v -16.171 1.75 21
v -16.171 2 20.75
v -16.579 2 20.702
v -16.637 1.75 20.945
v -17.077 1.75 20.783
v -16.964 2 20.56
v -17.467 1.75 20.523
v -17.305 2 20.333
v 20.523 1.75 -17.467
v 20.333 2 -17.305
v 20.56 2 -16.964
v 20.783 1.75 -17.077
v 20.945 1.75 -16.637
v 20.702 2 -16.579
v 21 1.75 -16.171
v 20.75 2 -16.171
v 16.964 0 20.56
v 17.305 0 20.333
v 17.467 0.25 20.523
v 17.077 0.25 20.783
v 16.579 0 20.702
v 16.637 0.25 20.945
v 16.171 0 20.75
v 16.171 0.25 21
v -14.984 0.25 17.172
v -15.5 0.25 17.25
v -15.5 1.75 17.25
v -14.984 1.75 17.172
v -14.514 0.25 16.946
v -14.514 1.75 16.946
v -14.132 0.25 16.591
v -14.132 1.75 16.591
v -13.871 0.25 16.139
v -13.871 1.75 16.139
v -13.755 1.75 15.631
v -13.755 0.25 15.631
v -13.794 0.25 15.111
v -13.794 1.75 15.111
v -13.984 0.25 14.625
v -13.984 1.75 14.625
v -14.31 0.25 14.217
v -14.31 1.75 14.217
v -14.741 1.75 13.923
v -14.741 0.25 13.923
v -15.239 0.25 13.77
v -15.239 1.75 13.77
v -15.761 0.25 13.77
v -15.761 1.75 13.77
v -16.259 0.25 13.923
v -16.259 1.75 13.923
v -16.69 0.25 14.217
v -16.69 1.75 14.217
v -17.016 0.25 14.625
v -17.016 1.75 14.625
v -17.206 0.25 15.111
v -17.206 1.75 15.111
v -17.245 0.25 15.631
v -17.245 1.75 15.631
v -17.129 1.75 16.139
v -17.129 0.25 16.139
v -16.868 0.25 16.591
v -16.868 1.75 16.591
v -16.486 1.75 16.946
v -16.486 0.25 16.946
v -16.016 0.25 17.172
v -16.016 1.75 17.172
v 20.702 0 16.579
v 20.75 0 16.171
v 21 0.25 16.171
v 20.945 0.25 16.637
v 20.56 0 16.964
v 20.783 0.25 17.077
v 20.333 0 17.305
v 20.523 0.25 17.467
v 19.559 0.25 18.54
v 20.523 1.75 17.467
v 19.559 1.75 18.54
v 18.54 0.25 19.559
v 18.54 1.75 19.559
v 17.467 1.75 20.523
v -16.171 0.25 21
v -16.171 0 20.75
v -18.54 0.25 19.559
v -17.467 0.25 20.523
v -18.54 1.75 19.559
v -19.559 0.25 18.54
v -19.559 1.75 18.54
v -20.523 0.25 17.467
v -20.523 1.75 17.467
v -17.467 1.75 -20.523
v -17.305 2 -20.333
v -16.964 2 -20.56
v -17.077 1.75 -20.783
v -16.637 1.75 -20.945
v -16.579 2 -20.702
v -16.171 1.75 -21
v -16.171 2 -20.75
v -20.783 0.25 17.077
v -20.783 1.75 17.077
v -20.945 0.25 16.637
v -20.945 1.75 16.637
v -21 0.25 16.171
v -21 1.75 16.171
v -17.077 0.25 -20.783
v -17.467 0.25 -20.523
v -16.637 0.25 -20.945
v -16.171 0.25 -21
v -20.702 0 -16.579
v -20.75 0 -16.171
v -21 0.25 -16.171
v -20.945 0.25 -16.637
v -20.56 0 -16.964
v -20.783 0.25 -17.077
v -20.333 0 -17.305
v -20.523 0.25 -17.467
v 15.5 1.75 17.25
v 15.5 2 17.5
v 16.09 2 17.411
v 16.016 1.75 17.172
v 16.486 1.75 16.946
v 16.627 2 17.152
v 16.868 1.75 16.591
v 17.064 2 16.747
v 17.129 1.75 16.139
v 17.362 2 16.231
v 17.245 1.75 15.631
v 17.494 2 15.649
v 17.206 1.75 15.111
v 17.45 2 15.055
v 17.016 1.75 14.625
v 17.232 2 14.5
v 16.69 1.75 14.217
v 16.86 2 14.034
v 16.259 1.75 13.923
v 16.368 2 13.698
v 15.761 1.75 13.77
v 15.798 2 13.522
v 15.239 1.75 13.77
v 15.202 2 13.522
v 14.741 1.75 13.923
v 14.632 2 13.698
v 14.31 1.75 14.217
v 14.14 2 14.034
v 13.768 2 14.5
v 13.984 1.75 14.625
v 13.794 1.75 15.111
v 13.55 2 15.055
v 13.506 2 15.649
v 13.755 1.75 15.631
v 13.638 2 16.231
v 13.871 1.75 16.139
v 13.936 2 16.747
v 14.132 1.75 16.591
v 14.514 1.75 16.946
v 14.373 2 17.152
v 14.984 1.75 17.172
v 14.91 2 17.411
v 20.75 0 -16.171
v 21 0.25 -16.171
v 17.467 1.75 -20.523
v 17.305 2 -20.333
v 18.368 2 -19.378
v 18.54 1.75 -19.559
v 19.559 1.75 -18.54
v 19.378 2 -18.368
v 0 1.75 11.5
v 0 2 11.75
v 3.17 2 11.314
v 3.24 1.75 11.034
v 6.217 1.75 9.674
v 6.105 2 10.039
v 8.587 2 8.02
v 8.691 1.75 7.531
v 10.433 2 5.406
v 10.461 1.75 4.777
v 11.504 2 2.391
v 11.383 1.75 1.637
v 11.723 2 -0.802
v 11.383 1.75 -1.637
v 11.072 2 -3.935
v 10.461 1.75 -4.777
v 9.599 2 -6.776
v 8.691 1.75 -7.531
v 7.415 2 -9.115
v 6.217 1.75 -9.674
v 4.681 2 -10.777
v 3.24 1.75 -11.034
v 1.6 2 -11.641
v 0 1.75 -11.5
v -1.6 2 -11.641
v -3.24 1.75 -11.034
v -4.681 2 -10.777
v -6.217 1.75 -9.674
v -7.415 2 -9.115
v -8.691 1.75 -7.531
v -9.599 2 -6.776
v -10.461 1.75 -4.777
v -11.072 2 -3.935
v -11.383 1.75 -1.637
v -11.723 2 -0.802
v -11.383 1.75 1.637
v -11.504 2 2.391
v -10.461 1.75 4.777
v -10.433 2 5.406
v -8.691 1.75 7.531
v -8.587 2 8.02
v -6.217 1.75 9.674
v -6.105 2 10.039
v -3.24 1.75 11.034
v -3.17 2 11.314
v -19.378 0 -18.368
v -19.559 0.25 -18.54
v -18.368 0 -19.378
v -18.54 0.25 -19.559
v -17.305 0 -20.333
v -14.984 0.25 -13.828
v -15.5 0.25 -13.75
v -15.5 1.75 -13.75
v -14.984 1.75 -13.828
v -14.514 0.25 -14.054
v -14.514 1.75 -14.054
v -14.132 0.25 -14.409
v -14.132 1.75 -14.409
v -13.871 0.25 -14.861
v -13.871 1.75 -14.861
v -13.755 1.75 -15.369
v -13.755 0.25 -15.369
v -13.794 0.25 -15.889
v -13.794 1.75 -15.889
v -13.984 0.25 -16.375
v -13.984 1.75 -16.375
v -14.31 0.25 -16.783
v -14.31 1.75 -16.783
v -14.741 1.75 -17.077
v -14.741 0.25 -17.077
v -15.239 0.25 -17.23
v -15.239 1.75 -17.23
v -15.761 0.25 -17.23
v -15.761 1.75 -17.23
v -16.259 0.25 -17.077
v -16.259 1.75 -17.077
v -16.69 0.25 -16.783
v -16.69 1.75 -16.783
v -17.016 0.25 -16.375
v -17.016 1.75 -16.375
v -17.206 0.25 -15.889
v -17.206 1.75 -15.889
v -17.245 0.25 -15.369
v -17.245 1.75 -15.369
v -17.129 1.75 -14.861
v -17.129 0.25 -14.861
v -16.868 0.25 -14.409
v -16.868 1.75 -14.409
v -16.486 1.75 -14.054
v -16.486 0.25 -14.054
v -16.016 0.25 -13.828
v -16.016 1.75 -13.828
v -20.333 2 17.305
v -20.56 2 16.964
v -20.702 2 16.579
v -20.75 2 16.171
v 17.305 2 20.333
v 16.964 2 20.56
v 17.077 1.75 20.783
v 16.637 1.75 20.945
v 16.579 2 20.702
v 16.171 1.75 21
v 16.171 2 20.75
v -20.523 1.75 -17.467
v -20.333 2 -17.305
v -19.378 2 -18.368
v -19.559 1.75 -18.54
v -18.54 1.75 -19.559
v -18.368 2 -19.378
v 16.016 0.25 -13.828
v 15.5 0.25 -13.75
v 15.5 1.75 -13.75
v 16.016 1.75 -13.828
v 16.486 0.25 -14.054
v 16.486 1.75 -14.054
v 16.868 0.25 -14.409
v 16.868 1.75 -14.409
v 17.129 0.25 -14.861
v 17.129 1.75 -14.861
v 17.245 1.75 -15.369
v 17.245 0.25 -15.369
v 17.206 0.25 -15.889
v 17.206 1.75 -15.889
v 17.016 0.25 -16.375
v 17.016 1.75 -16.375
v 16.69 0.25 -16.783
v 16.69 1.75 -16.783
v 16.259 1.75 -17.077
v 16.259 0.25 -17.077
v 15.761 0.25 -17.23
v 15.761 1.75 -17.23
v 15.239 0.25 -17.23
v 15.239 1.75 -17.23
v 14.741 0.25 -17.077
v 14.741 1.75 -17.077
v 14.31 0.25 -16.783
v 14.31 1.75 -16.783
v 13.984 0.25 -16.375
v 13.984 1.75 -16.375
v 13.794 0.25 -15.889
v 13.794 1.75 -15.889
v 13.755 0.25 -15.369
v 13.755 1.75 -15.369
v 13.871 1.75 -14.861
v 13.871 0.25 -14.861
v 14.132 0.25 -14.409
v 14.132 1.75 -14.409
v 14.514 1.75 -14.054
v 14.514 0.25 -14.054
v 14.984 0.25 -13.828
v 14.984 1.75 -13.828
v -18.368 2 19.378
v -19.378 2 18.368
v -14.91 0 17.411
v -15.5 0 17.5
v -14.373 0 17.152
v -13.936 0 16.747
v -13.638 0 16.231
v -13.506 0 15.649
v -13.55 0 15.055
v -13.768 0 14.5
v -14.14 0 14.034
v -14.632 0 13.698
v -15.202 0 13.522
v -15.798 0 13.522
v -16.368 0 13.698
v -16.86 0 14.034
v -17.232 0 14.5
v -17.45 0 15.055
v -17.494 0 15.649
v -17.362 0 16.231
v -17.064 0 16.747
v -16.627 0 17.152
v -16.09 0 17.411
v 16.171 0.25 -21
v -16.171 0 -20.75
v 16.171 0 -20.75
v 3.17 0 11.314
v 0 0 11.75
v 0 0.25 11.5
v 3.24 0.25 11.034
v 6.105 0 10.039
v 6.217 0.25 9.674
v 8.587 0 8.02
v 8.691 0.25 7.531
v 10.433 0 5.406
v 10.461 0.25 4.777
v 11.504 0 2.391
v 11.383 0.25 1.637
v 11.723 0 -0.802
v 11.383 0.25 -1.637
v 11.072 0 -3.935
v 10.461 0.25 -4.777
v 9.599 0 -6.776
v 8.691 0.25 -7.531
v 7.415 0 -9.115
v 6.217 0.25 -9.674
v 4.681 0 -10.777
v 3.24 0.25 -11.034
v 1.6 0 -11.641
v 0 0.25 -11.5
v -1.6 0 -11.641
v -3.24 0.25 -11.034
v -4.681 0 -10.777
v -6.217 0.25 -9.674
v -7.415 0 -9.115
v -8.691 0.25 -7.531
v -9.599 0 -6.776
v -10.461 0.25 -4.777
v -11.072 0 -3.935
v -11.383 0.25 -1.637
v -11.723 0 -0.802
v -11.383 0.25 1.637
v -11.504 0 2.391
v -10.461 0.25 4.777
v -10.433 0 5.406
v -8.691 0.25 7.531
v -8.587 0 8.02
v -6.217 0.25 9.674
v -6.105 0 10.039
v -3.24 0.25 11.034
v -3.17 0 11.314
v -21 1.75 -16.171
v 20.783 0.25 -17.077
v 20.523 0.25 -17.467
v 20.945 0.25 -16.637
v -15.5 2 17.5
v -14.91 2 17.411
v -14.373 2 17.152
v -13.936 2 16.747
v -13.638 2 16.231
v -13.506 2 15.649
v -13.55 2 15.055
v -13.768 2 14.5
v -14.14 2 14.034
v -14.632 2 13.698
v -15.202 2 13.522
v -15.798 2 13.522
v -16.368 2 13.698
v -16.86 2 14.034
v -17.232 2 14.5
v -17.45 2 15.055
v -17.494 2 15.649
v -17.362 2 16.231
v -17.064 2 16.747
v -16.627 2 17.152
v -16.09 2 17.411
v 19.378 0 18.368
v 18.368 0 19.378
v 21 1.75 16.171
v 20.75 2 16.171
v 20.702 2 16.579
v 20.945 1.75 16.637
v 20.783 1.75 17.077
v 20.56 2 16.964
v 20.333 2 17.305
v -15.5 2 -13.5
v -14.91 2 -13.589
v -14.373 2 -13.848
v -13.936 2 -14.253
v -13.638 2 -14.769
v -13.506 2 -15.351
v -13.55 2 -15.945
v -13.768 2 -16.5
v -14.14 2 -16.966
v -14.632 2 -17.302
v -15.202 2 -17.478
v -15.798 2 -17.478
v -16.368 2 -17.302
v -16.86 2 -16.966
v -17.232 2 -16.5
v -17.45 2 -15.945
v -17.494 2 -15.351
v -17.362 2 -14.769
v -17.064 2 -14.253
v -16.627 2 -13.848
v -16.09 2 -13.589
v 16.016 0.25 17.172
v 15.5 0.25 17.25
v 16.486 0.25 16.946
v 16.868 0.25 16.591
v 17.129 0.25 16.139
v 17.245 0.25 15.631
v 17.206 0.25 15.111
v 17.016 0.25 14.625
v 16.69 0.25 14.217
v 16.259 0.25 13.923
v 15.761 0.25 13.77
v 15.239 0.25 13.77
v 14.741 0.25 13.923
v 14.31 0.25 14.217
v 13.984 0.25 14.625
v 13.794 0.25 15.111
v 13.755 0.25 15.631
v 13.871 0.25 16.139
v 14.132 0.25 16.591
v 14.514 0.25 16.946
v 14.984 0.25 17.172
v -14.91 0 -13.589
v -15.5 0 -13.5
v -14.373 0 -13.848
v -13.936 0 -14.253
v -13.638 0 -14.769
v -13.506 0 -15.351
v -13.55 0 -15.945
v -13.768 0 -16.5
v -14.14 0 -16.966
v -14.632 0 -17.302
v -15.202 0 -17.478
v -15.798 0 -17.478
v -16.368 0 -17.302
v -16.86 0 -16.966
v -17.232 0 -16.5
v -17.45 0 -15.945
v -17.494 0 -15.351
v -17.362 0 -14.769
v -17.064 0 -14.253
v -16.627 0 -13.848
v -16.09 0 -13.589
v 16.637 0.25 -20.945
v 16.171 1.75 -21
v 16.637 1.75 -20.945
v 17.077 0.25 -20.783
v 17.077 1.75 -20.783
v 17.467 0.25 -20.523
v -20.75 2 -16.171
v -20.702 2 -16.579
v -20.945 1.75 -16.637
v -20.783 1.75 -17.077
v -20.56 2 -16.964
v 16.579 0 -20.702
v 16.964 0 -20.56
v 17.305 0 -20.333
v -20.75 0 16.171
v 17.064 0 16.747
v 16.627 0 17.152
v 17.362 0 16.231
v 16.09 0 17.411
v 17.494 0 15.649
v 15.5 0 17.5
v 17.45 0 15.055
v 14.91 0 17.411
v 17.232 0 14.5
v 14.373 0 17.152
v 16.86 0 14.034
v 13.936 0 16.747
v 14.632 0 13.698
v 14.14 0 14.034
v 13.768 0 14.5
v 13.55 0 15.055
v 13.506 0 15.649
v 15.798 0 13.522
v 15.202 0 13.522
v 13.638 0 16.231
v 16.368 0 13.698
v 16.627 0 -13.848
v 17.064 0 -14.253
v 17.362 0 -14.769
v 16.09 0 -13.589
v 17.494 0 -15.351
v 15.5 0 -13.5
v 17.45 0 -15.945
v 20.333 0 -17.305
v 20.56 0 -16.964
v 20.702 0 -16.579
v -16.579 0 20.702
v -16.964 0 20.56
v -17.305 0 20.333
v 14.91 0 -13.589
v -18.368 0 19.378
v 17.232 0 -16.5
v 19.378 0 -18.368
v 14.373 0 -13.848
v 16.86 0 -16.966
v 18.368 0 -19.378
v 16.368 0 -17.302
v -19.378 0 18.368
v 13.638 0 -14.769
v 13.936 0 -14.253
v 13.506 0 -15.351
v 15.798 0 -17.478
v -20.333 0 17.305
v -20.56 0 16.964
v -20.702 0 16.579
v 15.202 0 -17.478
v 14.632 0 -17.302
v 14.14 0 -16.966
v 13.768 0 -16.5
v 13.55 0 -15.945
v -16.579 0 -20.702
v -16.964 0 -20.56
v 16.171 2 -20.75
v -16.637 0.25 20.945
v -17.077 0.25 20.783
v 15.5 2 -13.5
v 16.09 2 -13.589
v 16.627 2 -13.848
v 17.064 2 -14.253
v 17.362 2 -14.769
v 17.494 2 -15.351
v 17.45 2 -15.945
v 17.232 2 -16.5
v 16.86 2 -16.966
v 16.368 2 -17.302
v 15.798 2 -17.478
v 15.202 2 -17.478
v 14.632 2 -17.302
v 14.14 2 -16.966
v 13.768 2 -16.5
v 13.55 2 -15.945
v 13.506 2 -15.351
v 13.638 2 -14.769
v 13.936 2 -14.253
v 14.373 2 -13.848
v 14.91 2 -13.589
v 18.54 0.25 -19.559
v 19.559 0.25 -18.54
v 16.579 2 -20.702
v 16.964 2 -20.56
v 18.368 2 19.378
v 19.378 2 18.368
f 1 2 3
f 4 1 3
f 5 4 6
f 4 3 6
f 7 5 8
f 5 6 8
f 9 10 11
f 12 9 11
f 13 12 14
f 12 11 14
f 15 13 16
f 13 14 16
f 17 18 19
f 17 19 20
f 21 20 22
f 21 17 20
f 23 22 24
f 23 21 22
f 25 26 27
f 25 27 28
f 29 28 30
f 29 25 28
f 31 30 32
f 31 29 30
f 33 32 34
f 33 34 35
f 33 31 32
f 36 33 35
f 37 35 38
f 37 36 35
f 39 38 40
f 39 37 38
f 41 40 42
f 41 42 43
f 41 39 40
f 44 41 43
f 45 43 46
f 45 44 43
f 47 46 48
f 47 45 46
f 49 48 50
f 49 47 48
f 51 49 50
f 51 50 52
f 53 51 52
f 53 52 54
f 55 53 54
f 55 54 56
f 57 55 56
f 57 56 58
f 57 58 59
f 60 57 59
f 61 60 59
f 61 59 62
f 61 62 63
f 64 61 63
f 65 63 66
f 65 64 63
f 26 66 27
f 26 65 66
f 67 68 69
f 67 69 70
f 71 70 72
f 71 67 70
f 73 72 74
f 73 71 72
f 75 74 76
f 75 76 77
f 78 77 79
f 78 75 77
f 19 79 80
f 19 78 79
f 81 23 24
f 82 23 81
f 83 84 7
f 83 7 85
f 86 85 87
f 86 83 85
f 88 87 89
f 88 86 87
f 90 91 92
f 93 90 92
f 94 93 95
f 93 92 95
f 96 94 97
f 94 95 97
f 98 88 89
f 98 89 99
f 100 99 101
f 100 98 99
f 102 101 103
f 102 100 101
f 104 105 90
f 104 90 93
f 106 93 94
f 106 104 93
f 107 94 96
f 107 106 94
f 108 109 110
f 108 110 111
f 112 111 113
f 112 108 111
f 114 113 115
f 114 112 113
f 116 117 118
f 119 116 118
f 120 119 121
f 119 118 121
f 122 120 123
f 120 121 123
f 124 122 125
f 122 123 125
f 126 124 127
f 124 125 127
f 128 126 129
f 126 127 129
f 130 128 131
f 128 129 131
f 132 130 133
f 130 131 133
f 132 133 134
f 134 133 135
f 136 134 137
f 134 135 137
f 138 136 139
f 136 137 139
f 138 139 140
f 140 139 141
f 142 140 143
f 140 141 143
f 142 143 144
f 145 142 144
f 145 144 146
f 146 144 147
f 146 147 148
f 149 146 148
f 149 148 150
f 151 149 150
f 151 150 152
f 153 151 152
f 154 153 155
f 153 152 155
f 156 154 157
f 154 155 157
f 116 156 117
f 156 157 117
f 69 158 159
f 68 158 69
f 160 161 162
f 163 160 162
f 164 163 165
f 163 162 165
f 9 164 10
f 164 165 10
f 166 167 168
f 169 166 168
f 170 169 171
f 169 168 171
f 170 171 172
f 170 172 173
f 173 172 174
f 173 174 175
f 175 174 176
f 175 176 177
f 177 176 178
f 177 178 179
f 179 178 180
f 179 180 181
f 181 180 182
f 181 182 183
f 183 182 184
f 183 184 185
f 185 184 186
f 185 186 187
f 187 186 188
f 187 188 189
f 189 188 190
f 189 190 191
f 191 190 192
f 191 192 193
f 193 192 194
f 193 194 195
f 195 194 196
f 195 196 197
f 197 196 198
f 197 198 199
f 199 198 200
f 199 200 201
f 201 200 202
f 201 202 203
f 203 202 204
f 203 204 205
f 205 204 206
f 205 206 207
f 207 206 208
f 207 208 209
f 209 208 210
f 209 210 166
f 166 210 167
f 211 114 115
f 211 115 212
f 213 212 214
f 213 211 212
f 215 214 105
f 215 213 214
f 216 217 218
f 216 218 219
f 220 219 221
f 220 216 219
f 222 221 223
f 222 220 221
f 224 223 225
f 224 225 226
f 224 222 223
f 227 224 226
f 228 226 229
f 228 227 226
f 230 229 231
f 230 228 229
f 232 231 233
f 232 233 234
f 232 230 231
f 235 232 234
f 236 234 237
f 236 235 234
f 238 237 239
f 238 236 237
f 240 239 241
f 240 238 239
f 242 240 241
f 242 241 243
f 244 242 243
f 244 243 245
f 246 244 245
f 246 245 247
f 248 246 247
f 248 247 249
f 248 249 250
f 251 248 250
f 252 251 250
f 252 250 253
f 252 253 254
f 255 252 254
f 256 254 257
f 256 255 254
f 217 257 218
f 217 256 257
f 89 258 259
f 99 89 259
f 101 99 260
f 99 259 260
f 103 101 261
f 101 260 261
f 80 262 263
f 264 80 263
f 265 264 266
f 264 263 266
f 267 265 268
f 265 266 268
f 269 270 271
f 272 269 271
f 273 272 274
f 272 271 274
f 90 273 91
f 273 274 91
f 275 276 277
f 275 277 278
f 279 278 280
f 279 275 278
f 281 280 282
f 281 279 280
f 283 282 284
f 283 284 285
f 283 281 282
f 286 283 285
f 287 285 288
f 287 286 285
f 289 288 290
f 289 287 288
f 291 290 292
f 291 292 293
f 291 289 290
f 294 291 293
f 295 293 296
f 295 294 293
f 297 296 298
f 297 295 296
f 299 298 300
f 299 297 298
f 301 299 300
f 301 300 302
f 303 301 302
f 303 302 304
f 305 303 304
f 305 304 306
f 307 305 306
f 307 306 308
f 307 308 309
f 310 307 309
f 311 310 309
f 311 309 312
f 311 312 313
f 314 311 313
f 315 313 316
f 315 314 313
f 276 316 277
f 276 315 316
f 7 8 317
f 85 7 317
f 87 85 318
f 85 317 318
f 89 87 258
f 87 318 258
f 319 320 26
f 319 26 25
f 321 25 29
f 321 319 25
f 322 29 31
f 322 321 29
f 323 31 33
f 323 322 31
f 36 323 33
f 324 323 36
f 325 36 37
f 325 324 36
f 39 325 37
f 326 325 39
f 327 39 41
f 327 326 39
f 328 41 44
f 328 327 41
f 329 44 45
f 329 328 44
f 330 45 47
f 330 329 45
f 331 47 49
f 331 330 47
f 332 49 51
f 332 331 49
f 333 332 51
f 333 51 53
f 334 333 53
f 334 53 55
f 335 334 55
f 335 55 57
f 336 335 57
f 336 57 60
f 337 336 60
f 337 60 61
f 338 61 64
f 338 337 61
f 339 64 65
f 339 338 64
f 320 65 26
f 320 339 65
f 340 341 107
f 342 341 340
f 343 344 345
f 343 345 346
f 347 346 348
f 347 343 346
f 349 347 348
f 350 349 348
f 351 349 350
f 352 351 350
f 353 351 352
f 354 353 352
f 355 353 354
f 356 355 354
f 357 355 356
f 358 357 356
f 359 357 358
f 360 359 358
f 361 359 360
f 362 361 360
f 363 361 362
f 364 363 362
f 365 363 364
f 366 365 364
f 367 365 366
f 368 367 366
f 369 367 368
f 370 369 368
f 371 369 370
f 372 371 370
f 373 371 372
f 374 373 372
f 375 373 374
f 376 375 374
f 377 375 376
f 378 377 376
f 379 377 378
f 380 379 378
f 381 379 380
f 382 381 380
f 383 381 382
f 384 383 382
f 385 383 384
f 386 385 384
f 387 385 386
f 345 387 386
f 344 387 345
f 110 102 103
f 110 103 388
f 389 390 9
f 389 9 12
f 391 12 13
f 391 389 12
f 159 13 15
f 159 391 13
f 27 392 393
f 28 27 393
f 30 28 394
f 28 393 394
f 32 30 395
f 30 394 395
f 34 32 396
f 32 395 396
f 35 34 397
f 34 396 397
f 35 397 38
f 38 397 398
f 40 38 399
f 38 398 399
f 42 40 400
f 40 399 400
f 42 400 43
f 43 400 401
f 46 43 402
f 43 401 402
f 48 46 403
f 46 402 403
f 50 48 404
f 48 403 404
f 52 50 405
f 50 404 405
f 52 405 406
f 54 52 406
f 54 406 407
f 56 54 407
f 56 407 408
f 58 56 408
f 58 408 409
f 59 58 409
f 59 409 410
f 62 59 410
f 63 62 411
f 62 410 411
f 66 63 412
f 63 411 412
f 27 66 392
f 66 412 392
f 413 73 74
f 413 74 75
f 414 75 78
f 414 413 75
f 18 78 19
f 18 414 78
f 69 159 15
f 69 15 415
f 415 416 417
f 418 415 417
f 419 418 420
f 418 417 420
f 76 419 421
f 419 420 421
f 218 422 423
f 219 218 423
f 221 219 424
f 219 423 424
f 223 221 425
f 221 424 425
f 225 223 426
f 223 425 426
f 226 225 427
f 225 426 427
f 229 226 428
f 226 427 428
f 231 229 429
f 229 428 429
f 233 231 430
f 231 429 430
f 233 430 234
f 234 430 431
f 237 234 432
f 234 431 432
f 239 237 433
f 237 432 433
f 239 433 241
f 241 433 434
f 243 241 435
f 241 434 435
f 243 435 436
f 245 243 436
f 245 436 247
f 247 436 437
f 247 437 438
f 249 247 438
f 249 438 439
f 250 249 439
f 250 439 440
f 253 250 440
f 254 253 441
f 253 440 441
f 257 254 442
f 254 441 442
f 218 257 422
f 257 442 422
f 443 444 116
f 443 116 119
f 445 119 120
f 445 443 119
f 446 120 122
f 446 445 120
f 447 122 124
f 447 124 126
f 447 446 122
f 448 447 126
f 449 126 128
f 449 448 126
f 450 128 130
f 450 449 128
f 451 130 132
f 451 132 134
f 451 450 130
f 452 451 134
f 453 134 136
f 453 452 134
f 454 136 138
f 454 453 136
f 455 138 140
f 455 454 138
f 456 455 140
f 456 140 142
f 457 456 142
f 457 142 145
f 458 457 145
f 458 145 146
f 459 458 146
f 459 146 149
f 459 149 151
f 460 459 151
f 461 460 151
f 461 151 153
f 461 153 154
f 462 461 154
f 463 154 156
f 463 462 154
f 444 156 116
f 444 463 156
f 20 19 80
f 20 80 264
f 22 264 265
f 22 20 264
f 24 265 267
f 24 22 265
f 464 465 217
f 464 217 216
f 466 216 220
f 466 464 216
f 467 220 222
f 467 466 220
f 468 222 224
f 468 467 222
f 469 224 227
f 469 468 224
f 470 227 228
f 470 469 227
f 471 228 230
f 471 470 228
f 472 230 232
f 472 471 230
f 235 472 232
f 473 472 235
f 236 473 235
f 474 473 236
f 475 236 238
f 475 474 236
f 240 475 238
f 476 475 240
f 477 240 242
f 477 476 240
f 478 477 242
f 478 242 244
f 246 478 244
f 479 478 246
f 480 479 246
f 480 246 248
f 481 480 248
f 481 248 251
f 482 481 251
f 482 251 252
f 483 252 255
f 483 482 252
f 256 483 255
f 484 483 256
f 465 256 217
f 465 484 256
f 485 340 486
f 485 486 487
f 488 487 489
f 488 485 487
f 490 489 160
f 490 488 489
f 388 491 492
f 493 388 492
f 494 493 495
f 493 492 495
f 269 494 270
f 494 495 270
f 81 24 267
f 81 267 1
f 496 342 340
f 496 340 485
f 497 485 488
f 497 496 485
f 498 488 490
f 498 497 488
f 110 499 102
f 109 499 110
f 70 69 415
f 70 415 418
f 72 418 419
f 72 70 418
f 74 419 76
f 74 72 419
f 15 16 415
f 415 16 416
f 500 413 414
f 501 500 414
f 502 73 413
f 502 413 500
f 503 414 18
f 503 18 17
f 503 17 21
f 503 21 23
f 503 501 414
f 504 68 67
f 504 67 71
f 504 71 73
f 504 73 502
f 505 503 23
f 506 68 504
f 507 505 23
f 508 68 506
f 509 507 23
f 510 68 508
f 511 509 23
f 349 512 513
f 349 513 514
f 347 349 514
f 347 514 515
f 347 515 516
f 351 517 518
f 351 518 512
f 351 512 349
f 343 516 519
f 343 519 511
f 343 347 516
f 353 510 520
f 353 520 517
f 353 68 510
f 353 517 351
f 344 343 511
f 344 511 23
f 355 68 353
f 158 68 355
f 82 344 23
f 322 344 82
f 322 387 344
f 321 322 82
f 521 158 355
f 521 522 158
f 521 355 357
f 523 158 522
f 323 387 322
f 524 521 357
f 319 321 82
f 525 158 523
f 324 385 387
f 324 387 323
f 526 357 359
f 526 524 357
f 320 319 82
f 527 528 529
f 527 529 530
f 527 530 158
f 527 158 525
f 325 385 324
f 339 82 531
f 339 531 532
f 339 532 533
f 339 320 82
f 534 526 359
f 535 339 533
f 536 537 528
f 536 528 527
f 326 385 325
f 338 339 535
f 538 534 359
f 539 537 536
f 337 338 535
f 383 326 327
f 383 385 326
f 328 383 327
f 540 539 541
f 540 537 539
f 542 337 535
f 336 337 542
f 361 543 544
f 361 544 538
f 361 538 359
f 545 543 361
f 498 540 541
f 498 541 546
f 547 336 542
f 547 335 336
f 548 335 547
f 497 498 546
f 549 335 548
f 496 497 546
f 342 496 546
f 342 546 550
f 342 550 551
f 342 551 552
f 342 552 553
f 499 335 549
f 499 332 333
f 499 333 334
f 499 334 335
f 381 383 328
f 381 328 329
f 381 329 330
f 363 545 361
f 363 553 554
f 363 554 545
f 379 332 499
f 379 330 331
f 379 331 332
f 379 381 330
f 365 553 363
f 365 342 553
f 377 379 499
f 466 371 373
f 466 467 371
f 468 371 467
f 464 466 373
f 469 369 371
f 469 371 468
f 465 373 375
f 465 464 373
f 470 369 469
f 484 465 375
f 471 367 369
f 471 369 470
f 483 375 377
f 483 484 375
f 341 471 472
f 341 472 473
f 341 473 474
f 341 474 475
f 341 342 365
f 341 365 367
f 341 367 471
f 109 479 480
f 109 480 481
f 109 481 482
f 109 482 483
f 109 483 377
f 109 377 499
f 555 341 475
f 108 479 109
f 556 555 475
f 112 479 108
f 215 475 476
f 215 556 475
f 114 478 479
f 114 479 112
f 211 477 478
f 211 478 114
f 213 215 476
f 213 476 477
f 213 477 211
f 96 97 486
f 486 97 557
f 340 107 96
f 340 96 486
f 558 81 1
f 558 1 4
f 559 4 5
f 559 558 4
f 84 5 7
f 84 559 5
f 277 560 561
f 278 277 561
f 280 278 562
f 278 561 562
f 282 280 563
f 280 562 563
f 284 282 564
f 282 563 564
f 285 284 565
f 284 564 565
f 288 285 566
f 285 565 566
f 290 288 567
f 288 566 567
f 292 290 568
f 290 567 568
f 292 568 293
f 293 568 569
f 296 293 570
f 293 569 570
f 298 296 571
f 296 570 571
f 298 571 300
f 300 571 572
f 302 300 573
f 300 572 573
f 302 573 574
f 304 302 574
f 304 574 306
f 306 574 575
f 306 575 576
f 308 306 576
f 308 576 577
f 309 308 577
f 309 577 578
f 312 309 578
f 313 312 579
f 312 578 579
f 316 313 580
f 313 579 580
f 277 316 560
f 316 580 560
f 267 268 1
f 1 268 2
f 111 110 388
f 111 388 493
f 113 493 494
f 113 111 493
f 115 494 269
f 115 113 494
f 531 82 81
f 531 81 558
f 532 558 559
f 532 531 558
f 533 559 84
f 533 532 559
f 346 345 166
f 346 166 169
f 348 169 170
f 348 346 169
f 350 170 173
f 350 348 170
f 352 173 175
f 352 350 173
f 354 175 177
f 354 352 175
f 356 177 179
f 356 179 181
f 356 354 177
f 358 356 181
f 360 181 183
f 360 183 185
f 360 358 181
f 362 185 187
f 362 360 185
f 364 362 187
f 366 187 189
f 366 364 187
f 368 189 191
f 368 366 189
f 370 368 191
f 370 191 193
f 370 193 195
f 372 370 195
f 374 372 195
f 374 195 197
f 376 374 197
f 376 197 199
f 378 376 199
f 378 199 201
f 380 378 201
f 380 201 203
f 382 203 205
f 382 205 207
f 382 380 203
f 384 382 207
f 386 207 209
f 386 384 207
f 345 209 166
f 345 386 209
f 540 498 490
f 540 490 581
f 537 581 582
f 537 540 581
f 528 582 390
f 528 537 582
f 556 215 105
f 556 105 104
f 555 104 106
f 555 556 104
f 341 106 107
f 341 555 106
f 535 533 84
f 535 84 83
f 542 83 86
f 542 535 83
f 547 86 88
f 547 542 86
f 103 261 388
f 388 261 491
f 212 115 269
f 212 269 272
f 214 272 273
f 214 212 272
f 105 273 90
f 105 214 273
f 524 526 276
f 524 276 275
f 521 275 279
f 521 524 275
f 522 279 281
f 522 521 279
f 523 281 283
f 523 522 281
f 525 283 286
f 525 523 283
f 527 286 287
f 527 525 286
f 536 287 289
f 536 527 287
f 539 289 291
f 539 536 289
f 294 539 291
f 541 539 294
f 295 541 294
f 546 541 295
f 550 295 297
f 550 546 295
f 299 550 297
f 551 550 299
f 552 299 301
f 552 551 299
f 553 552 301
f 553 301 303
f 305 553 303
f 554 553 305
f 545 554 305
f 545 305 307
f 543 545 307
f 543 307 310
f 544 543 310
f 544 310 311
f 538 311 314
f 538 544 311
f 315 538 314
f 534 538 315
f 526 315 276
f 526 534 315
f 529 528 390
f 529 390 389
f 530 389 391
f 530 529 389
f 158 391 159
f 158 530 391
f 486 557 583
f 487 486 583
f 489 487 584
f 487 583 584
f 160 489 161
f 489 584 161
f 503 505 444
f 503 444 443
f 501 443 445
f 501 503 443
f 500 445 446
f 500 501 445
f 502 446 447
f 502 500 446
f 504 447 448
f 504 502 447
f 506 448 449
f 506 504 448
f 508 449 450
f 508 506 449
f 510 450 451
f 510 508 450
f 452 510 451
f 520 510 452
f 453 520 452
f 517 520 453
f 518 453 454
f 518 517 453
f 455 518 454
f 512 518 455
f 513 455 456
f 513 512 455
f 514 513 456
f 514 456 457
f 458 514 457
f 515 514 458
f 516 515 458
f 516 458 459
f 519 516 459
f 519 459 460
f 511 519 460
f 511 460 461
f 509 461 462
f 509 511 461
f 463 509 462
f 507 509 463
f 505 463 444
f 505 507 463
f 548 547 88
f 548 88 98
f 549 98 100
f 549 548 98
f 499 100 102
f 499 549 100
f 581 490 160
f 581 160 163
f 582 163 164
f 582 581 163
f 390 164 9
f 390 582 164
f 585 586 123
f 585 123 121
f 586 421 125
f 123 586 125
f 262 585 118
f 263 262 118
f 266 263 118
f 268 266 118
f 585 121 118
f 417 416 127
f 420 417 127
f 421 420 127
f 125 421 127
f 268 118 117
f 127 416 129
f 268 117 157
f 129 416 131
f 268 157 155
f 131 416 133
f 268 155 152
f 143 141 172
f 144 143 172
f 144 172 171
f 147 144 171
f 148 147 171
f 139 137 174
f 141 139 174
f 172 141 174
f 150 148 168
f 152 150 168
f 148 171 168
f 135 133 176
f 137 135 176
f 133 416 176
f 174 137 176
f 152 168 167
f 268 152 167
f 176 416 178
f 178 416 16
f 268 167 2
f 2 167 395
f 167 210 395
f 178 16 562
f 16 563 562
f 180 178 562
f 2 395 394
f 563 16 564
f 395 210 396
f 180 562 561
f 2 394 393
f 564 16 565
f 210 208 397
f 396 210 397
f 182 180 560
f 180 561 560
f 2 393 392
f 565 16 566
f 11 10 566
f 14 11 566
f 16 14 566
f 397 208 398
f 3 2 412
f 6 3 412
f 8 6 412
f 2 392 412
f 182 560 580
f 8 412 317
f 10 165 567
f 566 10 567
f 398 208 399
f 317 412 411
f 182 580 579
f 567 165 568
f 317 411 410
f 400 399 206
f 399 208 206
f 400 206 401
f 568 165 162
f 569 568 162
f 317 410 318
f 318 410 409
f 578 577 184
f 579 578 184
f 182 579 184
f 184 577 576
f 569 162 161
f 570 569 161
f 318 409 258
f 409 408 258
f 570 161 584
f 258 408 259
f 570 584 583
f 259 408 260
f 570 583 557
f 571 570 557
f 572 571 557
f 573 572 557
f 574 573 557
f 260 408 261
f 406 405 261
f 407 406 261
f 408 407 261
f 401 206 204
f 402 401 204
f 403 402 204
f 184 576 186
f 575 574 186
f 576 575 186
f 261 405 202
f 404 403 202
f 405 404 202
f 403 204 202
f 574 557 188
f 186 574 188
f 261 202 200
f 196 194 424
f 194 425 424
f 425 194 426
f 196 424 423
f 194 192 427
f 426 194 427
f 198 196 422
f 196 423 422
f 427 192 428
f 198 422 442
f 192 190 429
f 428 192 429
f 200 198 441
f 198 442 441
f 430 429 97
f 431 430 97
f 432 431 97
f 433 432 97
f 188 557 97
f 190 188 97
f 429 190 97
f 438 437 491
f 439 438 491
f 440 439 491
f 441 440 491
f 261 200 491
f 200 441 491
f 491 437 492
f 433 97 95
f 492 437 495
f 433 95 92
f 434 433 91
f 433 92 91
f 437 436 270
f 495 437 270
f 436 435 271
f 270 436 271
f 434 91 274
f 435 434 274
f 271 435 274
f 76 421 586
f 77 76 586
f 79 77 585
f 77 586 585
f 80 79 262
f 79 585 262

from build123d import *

# Parameters (mm, degrees)
SKETCH1_R           = 11.5
SKETCH1_R_2         = 1.75
BOSS_EXTRUDE1_DEPTH = 2
CHAMFER1_SIZE       = 0.25


with BuildPart() as part:
    # Sketch1 → Boss-Extrude1 (new body)
    with BuildSketch(Plane(origin=(0, 0, 0), x_dir=(1, 0, 0), z_dir=(0, 1, 0))):
        with BuildLine():
            Line((16.171038928, -21), (-16.171038928, -21))
            ThreePointArc((-16.171038928, -21), (-16.861657425, -20.876977915), (-17.467314594, -20.523046092))
            ThreePointArc((-17.467314594, -20.523046092), (-19.056527753, -19.056527753), (-20.523046092, -17.467314594))
            ThreePointArc((-20.523046092, -17.467314594), (-20.876977915, -16.861657425), (-21, -16.171038928))
            Line((-21, -16.171038928), (-21, 16.171038928))
            ThreePointArc((-21, 16.171038928), (-20.876977915, 16.861657425), (-20.523046092, 17.467314594))
            ThreePointArc((-20.523046092, 17.467314594), (-19.056527753, 19.056527753), (-17.467314594, 20.523046092))
            ThreePointArc((-17.467314594, 20.523046092), (-16.861657425, 20.876977915), (-16.171038928, 21))
            Line((-16.171038928, 21), (16.171038928, 21))
            ThreePointArc((16.171038928, 21), (16.861657425, 20.876977915), (17.467314594, 20.523046092))
            ThreePointArc((17.467314594, 20.523046092), (19.056527753, 19.056527753), (20.523046092, 17.467314594))
            ThreePointArc((20.523046092, 17.467314594), (20.876977915, 16.861657425), (21, 16.171038928))
            Line((21, 16.171038928), (21, -16.171038928))
            ThreePointArc((21, -16.171038928), (20.876977915, -16.861657425), (20.523046092, -17.467314594))
            ThreePointArc((20.523046092, -17.467314594), (19.056527753, -19.056527753), (17.467314594, -20.523046092))
            ThreePointArc((17.467314594, -20.523046092), (16.861657425, -20.876977915), (16.171038928, -21))
        make_face()
        with Locations(Location((0, 0, 0), (0, 0, 270))):
            Circle(SKETCH1_R, mode=Mode.SUBTRACT)
        with Locations(Location((15.5, -15.5, 0), (0, 0, 270))):
            Circle(SKETCH1_R_2, mode=Mode.SUBTRACT)
        with Locations(Location((15.5, 15.5, 0), (0, 0, 270))):
            Circle(SKETCH1_R_2, mode=Mode.SUBTRACT)
        with Locations(Location((-15.5, 15.5, 0), (0, 0, 270))):
            Circle(SKETCH1_R_2, mode=Mode.SUBTRACT)
        with Locations(Location((-15.5, -15.5, 0), (0, 0, 270))):
            Circle(SKETCH1_R_2, mode=Mode.SUBTRACT)
    extrude(amount=BOSS_EXTRUDE1_DEPTH)

    # Chamfer1
    chamfer1_edges = [part.edges().sort_by_distance(p)[0] for p in [
        (20.876977915, 2, 16.861657425),
        (21, 2, 0),
        (0, 0, 21),
        (-16.861657425, 0, 20.876977915),
        (-19.056527753, 0, 19.056527753),
        (-20.876977915, 0, 16.861657425),
        (-21, 0, 0),
        (20.876977915, 2, -16.861657425),
        (-20.876977915, 0, -16.861657425),
        (-19.056527753, 0, -19.056527753),
        (-16.861657425, 0, -20.876977915),
        (0, 0, -21),
        (16.861657425, 0, -20.876977915),
        (19.056527753, 0, -19.056527753),
        (20.876977915, 0, -16.861657425),
        (21, 0, 0),
        (19.056527753, 2, -19.056527753),
        (20.876977915, 0, 16.861657425),
        (19.056527753, 0, 19.056527753),
        (16.861657425, 0, 20.876977915),
        (16.861657425, 2, -20.876977915),
        (0, 2, -21),
        (-16.861657425, 2, -20.876977915),
        (-19.056527753, 2, -19.056527753),
        (-20.876977915, 2, -16.861657425),
        (-21, 2, 0),
        (0, 0, -11.5),
        (0, 2, -11.5),
        (16.861657425, 2, 20.876977915),
        (-20.876977915, 2, 16.861657425),
        (15.5, 0, 13.75),
        (15.5, 2, 13.75),
        (-19.056527753, 2, 19.056527753),
        (-16.861657425, 2, 20.876977915),
        (15.5, 0, -17.25),
        (15.5, 2, -17.25),
        (0, 2, 21),
        (-15.5, 0, -17.25),
        (-15.5, 2, -17.25),
        (-15.5, 0, 13.75),
        (-15.5, 2, 13.75),
        (19.056527753, 2, 19.056527753),
    ]]
    chamfer(chamfer1_edges, length=CHAMFER1_SIZE)


solid = part.part
